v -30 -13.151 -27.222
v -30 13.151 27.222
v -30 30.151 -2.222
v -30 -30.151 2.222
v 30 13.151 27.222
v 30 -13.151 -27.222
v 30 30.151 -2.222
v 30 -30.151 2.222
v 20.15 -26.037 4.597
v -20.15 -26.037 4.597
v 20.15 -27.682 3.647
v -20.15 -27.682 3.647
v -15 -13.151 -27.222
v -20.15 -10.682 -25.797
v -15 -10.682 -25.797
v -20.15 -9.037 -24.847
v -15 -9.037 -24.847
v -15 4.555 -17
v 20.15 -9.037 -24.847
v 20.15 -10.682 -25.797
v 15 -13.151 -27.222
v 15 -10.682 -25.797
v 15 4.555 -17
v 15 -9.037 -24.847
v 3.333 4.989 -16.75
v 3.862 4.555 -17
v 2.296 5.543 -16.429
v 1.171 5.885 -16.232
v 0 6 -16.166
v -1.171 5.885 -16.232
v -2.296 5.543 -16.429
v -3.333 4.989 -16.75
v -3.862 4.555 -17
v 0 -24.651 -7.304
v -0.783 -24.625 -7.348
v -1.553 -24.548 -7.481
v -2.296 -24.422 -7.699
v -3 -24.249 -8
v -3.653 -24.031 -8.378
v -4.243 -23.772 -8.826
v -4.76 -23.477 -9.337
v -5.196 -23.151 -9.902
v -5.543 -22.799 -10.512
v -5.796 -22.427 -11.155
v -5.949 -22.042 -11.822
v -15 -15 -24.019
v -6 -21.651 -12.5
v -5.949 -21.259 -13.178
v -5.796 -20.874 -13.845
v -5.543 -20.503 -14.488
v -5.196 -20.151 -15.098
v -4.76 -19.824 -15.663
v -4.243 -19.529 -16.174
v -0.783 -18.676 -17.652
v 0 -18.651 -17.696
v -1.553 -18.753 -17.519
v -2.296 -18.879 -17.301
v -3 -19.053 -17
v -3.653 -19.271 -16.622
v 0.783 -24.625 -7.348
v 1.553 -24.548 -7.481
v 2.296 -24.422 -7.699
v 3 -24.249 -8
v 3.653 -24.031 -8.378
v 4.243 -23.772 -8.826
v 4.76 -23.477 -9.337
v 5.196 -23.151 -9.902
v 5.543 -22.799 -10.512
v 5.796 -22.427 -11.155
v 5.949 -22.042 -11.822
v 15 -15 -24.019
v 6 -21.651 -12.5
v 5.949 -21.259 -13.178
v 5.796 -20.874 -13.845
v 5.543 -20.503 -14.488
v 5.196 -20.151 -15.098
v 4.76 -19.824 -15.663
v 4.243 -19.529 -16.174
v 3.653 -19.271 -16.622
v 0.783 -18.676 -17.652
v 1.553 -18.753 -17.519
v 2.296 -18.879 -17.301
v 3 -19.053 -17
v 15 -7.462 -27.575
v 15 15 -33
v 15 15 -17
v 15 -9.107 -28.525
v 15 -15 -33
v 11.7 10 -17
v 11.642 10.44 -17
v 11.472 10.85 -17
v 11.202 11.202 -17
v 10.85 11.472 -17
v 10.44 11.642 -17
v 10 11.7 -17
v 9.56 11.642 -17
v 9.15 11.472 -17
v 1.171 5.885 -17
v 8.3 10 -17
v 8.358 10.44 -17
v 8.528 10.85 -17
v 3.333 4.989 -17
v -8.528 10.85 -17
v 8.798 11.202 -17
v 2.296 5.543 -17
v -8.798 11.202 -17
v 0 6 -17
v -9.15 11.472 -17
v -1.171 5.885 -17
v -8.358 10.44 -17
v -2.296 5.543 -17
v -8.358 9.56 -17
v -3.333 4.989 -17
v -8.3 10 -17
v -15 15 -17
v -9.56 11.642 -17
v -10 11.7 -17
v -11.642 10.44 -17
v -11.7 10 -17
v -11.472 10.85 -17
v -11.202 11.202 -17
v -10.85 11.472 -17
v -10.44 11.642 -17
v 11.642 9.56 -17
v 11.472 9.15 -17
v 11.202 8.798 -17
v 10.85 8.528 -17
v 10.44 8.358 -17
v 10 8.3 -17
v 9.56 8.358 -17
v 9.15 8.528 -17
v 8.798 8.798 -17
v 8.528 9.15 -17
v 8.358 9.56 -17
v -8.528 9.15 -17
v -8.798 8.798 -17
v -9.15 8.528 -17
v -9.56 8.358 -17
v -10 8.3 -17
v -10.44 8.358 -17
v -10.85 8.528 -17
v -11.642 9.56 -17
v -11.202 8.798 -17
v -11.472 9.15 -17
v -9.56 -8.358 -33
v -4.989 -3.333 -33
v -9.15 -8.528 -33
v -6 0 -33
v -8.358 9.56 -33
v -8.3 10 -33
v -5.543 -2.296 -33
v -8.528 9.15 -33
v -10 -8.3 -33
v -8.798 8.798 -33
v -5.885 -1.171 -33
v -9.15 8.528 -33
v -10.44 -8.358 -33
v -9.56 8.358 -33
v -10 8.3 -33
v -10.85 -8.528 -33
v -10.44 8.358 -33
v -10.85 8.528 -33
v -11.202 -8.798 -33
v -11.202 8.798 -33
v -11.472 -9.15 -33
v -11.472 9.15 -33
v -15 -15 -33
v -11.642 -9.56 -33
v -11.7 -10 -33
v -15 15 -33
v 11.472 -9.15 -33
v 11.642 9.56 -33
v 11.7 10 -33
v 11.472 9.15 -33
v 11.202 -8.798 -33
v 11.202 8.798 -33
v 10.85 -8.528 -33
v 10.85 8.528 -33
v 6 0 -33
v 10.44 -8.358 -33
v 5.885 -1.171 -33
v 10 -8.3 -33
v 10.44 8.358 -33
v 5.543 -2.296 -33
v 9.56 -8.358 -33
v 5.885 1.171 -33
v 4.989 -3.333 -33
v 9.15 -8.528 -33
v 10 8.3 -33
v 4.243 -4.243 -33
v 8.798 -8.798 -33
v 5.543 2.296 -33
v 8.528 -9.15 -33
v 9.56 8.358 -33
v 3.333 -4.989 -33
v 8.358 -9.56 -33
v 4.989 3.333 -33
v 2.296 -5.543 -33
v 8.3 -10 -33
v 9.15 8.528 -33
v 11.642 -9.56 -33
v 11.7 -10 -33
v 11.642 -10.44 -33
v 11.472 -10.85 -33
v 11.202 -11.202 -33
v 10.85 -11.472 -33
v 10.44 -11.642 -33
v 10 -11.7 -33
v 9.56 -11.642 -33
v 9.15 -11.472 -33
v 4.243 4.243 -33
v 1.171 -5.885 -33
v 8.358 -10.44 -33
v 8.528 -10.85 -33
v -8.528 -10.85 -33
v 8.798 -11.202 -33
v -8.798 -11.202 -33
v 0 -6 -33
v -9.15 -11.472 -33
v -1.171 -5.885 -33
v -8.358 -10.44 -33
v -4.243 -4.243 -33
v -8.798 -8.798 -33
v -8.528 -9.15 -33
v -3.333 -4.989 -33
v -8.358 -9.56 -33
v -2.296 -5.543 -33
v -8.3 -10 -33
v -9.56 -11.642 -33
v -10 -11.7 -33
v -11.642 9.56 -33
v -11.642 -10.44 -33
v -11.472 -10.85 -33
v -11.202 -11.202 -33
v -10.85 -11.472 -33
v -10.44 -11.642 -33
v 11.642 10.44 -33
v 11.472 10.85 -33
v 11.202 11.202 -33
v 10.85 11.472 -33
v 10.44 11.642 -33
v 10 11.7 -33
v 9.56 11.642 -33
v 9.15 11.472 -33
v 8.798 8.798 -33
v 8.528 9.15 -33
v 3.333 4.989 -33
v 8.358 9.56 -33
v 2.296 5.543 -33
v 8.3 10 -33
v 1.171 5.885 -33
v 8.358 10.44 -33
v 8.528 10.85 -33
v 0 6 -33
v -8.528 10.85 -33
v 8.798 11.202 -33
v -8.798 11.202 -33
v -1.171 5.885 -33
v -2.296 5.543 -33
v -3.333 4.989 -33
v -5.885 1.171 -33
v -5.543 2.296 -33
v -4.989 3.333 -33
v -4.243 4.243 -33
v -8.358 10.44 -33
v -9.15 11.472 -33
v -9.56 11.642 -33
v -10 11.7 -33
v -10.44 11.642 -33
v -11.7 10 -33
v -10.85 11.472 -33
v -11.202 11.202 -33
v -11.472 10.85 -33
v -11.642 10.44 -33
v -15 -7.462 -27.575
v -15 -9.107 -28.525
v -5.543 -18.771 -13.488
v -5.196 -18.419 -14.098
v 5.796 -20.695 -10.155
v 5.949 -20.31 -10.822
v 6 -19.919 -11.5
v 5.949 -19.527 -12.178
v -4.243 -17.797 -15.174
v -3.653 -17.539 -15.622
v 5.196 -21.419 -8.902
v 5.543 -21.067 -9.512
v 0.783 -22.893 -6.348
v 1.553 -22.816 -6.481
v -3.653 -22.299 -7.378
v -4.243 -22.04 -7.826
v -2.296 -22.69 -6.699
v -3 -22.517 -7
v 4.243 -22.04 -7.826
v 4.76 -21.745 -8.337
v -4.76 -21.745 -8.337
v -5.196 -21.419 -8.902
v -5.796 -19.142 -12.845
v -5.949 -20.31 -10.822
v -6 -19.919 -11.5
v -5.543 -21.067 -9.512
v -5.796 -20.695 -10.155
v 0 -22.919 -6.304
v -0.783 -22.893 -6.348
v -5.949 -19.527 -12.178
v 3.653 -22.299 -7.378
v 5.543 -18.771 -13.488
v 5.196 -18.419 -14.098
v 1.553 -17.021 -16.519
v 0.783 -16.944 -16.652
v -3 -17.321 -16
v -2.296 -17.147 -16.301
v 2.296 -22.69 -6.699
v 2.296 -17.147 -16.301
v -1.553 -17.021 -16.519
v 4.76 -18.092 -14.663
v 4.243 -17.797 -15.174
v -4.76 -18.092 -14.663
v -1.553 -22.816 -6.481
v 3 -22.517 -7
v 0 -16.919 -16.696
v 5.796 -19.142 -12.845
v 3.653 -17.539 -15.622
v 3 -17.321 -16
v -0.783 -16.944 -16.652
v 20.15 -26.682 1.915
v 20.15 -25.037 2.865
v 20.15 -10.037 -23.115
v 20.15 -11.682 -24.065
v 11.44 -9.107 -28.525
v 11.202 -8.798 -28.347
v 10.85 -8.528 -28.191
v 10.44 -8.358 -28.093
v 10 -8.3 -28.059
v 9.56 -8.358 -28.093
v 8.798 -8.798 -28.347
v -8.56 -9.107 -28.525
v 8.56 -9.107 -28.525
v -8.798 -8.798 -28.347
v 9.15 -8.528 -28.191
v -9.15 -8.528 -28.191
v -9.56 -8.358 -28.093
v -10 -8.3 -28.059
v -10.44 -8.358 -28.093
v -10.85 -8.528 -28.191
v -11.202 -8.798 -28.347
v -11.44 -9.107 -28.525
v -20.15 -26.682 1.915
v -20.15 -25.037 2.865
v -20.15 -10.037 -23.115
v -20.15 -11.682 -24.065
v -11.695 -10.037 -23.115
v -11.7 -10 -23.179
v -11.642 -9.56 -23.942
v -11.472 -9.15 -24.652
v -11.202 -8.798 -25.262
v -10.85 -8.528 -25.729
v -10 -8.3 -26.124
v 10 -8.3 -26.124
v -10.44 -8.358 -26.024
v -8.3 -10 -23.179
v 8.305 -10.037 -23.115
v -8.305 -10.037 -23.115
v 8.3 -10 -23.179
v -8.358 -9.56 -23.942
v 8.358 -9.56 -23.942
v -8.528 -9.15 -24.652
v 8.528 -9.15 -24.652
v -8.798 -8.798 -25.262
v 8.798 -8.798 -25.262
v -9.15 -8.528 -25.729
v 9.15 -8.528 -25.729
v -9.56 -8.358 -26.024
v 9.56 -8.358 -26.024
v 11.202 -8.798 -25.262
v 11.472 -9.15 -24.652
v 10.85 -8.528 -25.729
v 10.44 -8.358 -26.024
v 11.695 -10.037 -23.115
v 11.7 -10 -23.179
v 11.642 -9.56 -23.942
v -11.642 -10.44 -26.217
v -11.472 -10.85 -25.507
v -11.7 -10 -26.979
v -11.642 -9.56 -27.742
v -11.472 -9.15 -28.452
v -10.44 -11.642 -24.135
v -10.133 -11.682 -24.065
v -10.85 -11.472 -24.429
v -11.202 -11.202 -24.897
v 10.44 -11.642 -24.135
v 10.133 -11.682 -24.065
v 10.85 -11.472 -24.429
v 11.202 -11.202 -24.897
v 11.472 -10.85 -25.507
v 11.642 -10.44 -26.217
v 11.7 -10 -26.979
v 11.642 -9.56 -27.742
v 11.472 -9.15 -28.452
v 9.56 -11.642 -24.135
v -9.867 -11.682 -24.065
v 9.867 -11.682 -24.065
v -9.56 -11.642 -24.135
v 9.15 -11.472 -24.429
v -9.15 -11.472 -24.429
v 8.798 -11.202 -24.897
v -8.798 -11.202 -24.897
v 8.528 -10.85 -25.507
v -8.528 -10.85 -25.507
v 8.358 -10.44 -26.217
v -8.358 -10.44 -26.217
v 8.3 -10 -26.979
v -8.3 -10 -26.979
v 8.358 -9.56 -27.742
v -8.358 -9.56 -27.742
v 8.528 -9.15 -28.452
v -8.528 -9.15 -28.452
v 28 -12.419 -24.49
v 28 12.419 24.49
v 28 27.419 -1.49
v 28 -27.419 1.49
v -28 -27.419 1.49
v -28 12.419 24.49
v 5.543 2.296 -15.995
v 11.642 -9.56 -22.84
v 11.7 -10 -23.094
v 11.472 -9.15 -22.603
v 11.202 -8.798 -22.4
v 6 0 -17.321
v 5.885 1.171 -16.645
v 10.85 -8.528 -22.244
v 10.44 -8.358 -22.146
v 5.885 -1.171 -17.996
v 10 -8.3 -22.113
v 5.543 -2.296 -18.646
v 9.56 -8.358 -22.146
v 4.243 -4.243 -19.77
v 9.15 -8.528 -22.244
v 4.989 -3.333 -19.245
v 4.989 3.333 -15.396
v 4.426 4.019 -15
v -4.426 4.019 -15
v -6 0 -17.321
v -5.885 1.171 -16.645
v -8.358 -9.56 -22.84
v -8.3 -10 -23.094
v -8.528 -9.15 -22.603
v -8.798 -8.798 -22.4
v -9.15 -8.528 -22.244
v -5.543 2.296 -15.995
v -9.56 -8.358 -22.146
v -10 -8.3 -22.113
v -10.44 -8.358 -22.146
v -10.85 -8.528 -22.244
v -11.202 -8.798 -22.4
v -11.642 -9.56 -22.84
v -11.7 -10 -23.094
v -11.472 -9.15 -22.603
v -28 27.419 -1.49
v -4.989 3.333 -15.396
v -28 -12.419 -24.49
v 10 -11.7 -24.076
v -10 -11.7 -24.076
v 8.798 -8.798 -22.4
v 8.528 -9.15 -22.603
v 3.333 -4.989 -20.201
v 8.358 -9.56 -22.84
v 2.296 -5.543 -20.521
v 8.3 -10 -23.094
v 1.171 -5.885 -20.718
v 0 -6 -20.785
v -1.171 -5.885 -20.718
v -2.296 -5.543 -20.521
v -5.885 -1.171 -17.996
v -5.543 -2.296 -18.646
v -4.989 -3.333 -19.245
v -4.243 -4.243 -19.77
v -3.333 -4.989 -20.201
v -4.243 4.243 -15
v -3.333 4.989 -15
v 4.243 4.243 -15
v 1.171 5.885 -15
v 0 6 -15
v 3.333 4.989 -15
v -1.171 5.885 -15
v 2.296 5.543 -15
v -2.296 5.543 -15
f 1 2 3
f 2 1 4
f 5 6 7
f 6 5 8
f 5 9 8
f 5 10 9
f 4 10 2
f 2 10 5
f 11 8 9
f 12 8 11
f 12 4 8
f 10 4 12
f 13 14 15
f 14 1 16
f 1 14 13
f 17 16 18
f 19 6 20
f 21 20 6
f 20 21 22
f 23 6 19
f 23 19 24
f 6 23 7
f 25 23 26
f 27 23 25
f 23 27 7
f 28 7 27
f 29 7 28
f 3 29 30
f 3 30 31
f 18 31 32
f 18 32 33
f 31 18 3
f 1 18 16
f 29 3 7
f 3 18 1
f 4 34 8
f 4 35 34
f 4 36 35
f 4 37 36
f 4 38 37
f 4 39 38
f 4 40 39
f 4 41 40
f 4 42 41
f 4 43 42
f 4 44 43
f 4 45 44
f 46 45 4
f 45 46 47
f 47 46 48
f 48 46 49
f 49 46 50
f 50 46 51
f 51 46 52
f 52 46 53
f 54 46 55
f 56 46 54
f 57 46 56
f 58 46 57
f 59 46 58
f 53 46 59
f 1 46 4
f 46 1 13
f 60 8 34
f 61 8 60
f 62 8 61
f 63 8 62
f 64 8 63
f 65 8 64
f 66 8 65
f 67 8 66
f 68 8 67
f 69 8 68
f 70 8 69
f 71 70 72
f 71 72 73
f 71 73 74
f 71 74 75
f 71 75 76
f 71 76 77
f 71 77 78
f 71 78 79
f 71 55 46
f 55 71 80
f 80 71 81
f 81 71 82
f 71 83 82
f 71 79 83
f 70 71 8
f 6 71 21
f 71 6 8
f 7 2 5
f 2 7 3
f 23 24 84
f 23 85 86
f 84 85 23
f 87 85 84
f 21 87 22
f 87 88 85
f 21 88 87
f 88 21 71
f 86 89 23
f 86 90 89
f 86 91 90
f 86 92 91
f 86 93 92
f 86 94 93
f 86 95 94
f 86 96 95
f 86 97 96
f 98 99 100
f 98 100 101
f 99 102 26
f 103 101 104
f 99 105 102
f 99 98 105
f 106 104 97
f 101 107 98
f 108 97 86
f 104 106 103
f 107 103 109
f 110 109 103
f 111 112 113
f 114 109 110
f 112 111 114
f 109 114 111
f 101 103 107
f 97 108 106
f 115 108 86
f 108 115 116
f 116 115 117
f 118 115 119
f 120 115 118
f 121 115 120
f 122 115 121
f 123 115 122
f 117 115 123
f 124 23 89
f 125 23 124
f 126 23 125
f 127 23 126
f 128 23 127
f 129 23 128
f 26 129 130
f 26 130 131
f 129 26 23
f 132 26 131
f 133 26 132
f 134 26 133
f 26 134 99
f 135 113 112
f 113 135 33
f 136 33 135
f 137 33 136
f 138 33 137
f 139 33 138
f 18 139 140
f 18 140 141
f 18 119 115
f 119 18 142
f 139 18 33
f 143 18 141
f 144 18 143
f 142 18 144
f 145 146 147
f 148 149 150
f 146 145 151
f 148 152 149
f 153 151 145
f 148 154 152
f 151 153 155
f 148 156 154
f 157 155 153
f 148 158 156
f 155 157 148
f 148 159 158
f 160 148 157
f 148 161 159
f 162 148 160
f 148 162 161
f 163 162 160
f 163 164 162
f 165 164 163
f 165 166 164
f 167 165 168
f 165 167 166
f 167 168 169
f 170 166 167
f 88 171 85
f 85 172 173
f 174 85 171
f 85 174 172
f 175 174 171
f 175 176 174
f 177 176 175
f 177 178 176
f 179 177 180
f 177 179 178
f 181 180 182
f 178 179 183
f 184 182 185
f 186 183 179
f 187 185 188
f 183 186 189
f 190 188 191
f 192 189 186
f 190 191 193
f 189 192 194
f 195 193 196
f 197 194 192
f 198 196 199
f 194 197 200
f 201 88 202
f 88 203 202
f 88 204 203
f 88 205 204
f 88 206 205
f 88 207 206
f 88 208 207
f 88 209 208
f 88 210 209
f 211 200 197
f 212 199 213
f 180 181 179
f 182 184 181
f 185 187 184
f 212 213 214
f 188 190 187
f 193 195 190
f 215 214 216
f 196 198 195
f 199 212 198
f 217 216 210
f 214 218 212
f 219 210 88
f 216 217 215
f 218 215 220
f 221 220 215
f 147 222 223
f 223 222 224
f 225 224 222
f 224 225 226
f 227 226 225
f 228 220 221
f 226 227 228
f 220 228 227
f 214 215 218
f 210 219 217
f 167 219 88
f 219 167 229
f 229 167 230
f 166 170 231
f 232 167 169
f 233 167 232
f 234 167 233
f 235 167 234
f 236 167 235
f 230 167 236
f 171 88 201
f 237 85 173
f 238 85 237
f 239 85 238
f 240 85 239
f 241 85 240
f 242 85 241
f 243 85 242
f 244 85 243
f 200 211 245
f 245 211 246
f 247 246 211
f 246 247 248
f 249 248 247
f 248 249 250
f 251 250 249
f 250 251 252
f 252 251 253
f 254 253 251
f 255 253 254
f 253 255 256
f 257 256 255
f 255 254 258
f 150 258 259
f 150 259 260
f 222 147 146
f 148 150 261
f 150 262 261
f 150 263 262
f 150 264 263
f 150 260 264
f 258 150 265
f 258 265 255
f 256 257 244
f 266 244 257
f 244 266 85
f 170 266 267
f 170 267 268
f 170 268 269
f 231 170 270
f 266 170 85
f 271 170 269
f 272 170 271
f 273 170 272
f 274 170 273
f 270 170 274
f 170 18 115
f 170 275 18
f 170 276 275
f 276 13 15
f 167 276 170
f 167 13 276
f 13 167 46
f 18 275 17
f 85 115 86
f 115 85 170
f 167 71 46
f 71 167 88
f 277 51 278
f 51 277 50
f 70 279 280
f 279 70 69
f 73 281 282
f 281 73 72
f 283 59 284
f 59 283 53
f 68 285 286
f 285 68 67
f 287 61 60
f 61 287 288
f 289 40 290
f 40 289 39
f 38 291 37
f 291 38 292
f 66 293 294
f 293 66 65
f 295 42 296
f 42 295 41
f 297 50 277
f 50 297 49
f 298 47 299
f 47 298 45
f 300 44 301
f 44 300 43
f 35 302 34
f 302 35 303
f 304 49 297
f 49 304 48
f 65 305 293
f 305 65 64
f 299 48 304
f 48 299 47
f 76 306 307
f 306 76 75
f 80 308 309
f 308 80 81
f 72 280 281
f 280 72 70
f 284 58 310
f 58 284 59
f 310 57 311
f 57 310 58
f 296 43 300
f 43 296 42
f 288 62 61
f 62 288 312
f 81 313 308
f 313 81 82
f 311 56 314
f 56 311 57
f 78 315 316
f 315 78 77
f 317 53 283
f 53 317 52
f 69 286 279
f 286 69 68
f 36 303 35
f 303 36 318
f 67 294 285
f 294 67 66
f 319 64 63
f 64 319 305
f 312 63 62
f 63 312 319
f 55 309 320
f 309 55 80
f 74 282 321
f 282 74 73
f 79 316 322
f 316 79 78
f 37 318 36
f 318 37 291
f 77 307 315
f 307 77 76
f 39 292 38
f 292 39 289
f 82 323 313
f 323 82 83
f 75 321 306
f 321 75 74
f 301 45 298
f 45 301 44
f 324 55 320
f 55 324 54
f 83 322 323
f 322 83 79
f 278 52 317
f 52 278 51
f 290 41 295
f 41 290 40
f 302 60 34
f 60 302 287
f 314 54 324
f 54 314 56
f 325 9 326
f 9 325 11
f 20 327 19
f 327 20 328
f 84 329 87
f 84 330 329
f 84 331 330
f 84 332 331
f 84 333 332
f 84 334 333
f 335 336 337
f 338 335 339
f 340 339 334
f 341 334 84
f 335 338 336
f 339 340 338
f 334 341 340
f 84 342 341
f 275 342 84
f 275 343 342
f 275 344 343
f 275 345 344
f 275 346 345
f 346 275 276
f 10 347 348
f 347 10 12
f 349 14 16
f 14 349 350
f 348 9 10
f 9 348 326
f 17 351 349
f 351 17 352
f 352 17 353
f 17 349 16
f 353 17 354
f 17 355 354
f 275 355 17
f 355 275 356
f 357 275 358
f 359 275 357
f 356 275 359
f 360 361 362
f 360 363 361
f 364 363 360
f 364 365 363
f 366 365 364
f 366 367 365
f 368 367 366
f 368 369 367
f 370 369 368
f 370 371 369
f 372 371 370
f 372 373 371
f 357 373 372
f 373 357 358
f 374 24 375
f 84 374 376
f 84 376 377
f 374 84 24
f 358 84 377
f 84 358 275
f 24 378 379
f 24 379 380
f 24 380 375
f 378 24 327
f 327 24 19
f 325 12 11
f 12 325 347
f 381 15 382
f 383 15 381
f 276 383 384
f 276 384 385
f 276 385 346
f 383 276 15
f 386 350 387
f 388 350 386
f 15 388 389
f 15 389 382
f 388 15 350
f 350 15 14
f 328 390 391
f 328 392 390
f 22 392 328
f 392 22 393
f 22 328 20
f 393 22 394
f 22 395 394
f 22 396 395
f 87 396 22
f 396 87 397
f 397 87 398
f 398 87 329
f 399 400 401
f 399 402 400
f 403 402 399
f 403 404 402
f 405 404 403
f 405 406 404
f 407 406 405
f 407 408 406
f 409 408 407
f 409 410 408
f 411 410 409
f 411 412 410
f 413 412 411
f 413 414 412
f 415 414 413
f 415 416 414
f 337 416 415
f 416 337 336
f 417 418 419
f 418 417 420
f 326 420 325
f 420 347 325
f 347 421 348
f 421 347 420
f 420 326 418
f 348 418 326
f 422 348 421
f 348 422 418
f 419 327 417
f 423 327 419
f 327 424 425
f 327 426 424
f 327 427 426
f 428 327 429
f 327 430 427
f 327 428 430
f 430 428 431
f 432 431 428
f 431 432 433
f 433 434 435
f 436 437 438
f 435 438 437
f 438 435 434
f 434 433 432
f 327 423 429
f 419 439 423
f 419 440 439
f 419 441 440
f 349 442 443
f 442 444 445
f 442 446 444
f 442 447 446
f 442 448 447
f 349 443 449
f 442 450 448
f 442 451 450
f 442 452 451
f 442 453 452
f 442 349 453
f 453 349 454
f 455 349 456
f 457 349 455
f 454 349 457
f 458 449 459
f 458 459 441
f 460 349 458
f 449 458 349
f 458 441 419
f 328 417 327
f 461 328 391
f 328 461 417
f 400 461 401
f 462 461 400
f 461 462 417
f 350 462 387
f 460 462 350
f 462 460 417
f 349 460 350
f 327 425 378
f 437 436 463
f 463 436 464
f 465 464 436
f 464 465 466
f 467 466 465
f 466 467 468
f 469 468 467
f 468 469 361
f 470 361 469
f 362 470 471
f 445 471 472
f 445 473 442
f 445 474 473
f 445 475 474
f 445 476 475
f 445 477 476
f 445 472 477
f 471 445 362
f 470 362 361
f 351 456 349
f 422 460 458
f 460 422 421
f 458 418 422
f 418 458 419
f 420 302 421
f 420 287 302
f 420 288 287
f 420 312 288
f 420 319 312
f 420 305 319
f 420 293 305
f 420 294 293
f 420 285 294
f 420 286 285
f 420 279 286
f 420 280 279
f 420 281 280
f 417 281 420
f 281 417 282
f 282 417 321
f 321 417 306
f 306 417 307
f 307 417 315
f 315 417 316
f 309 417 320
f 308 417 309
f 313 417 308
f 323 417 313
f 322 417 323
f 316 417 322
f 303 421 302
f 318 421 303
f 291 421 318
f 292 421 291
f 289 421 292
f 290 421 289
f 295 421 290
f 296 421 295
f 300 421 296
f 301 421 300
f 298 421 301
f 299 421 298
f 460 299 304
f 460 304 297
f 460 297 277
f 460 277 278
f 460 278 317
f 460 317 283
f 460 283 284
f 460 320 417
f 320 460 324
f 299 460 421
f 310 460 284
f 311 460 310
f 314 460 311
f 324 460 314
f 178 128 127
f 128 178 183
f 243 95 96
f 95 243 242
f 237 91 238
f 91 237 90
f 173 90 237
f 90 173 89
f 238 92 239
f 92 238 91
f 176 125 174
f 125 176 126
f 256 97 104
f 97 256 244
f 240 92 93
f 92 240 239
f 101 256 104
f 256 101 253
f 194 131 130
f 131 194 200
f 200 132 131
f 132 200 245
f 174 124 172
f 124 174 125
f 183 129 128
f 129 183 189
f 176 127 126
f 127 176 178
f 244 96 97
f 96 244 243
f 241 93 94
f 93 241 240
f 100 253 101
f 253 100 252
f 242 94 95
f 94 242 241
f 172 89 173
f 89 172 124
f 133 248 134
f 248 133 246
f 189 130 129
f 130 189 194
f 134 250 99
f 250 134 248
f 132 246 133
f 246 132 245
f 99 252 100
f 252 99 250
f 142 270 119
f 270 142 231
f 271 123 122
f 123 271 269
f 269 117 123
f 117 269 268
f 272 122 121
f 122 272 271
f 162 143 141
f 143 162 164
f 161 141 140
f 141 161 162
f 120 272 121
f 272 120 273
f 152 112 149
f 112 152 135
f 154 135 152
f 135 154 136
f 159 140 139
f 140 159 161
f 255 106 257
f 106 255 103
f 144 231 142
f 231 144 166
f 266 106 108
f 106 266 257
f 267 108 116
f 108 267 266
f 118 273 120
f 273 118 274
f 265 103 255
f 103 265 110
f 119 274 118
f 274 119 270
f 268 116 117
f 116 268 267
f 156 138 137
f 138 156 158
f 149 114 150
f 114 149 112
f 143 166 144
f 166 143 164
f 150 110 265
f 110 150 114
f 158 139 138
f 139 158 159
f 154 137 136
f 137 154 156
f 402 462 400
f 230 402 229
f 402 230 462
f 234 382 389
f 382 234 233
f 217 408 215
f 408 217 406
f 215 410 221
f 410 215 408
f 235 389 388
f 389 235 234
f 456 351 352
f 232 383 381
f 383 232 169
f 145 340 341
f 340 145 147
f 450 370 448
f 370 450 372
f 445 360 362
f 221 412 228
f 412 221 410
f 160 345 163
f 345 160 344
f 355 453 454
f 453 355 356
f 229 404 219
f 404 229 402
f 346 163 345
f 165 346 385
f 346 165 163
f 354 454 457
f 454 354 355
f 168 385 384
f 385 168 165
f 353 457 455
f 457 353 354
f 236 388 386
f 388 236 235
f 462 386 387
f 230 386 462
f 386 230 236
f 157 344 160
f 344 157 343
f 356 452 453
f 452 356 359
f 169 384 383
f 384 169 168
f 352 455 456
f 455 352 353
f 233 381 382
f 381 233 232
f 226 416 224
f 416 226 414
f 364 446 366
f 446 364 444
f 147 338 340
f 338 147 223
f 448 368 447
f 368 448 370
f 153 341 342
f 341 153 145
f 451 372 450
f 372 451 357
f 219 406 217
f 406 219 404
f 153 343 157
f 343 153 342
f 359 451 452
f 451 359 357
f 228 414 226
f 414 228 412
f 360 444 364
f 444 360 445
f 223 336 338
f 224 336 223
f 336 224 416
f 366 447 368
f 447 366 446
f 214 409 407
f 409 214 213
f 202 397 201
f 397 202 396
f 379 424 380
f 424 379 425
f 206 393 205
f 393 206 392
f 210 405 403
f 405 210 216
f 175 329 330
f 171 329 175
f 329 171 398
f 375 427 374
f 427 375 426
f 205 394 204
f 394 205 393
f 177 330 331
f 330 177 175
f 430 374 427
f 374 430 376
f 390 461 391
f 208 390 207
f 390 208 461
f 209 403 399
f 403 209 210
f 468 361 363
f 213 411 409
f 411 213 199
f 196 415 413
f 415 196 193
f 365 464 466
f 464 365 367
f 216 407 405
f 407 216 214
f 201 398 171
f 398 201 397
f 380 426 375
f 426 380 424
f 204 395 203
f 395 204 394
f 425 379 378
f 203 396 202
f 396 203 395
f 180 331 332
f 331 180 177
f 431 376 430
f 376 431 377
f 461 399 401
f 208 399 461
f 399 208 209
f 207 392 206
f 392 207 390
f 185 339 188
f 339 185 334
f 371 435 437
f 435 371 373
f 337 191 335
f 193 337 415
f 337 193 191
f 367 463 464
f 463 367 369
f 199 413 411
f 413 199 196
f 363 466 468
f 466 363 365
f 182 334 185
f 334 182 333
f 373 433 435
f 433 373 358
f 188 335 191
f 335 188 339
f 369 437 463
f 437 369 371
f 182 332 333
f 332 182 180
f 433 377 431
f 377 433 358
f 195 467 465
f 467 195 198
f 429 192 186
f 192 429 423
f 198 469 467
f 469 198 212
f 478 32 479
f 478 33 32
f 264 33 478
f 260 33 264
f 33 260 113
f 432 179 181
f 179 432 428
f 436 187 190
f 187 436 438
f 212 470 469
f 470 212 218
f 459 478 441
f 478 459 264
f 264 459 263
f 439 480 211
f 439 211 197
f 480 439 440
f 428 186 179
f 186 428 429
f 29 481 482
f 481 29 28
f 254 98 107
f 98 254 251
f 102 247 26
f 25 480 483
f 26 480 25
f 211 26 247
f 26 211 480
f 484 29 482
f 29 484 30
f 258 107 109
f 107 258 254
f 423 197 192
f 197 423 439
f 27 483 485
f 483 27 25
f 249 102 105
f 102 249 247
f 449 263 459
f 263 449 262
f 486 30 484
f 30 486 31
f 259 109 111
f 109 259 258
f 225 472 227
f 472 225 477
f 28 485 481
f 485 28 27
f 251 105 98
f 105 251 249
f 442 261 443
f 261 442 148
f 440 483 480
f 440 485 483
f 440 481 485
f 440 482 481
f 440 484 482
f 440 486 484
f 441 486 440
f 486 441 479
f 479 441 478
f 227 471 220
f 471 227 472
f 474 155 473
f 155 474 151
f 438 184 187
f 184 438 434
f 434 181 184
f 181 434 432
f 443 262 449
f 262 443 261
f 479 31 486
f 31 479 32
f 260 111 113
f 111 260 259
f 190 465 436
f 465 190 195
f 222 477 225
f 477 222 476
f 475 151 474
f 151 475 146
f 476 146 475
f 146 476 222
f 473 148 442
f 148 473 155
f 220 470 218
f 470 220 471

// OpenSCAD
// file: common.scad
// common.scad — every dimension in the feeder lives here.
// Change a value, re-run ../check.sh, and every part regrows together.

/* ---------- Printer envelope ---------- */
bed_x = 220;
bed_y = 220;
bed_z = 250;

/* ---------- Material and process ---------- */
wall      = 2.0;    // nominal wall thickness (5 perimeters at 0.4 nozzle)
fit_slide = 0.30;   // clearance for parts that must move against each other
fit_press = 0.15;   // clearance for parts pressed together
$fn       = 96;

/* ---------- Fasteners ---------- */
m3_free = 3.4;      // M3 clearance hole
m3_tap  = 2.8;      // M3 self-tapping into plastic
m4_free = 4.5;

/* ---------- Load cells (VERIFY against the cells you actually buy) ----------
   Figures below are for the common YZC-133 straight bar. Bolt spacing varies
   between suppliers; measure yours before printing the base or the platform. */
cell_l            = 80;
cell_w            = 12.7;
cell_h            = 12.7;
cell_bolt_spacing = 15;   // centre-to-centre, at each end
cell_gap          = 3;    // spacer thickness — the beam MUST be free to flex

/* ---------- Food model ---------- */
kibble_density = 0.40;   // g/cm^3, dry kibble bulk density

/* ---------- Hopper ---------- */
hopper_volume_l = 2.0;
hopper_mouth    = 140;   // inner, square, at the top
hopper_throat   = 55;    // inner, square, at the bottom

// Square frustum volume: V = h/3 * (A1 + A2 + sqrt(A1*A2))
// For squares sqrt(A1*A2) collapses to mouth*throat, so height is exact:
hopper_h = 3 * hopper_volume_l * 1000000 /
           (hopper_mouth*hopper_mouth + hopper_throat*hopper_throat +
            hopper_mouth*hopper_throat);

hopper_run        = (hopper_mouth - hopper_throat) / 2;
hopper_wall_angle = atan(hopper_h / hopper_run);   // from horizontal
hopper_taper_rate = (hopper_mouth - hopper_throat) / hopper_h;
hopper_capacity_g = hopper_volume_l * 1000 * kibble_density;

/* ---------- Drum valve ---------- */
drum_dia       = 50;
drum_len       = 60;
drum_clearance = 0.4;                      // radial
drum_bore      = drum_dia + 2*drum_clearance;
pocket_depth   = 11.3;                     // segment depth of the scoop
shaft_dia      = 6;
shaft_len      = 8;

// Circular-segment maths. OpenSCAD trig is in DEGREES; the segment area
// formula needs the angle in RADIANS, hence the two forms below.
drum_r          = drum_dia / 2;
pocket_theta    = 2 * acos(1 - pocket_depth/drum_r);        // degrees
pocket_theta_r  = pocket_theta * PI / 180;                  // radians
pocket_area     = drum_r*drum_r/2 * (pocket_theta_r - sin(pocket_theta));
pocket_volume   = pocket_area * drum_len;                   // mm^3
sweep_grams     = pocket_volume / 1000 * kibble_density;    // DERIVED, not assumed

/* ---------- Valve housing ---------- */
housing_x = drum_len + 4*wall;      // along the drum axis
housing_y = drum_bore + 4*wall;
housing_z = drum_bore + 4*wall;
outlet_x  = 45;
outlet_y  = 45;

/* ---------- Chute ---------- */
chute_forward = 70;    // how far forward of the tower the food lands
chute_drop    = 90;    // vertical fall from valve outlet to chute exit
chute_exit    = 40;
chute_clear   = 40;    // exit height above the bowl rim — impulse, not load

/* ---------- Bowl and platform ---------- */
bowl_dia     = 140;    // the BOUGHT stainless/ceramic bowl
platform_dia = 150;
platform_t   = 5;
ring_w       = 3;
ring_h       = 8;
bowl_gap     = 6;      // air on every side — the isolation gap

/* ---------- Base and tower ---------- */
base_size = 190;
base_t    = 6;
bay_h     = 28;        // electronics bay height
tower_w   = 90;
tower_d   = 70;
tower_h   = 150;

/* ---------- Head ---------- */
head_tilt   = 30;      // camera, degrees down from horizontal
cam_pcb     = [40, 40, 1.6];
sr04_dia    = 16;
sr04_pitch  = 26;      // centre-to-centre of the two transducers

/* ---------- Derived overall ---------- */
total_h = base_t + bay_h + tower_h + housing_z + hopper_h;

/* ---------- Assertions: the things that silently ruin a print ---------- */
assert(hopper_wall_angle >= 60,
       str("Hopper wall ", hopper_wall_angle, " deg is below 60 - kibble will bridge"));
assert(hopper_h + 2*wall <= bed_z,
       str("Hopper ", hopper_h, " mm exceeds bed Z ", bed_z));
assert(hopper_mouth + 2*wall <= bed_x,
       "Hopper mouth exceeds bed X");
assert(base_size <= bed_x && base_size <= bed_y,
       "Base exceeds bed footprint");
assert(platform_dia <= bed_x, "Bowl platform exceeds bed X");
assert(drum_clearance > 0, "Drum clearance must be positive or the drum seizes");
assert(drum_bore > drum_dia, "Drum bore must exceed drum diameter");
assert(pocket_depth < drum_r,
       "Pocket deeper than the drum radius - the scoop would cut through the axis");
assert(sweep_grams > 6 && sweep_grams < 10,
       str("Sweep delivers ", sweep_grams, " g - outside the 6-10 g design window"));
assert(bowl_gap > 0, "Bowl isolation gap must be positive");
assert(cell_gap > 0, "Load cell needs a flex gap or it reads nothing");
assert(chute_forward + 40 <= bed_y,
       "Bowl arm exceeds bed Y - split it or shorten chute_forward");

/* ---------- Shared geometry ---------- */
// A square frustum, bottom face on the XY plane, centred on Z.
module frustum(bottom, top, h) {
  linear_extrude(height = h, scale = top/bottom)
    square([bottom, bottom], center = true);
}

// A rectangular tube used for the labyrinth lip on the lid and hopper mouth.
module lip(inner, thickness, h) {
  difference() {
    cube([inner + 2*thickness, inner + 2*thickness, h], center = true);
    cube([inner, inner, h + 1], center = true);
  }
}

// Four bolt holes on a square pattern.
module bolt_square(spacing, dia, h) {
  for (i = [0:3])
    rotate([0, 0, 90*i])
      translate([spacing/2, spacing/2, 0])
        cylinder(d = dia, h = h, center = true, $fn = 24);
}

// The cantilever footprint a load cell bolts into: two holes plus a relief slot.
module cell_mount(dia = m3_tap, h = 10) {
  for (y = [-cell_bolt_spacing/2, cell_bolt_spacing/2])
    translate([0, y, 0]) cylinder(d = dia, h = h, center = true, $fn = 24);
}

echo(str("hopper_h = ", hopper_h, " mm"));
echo(str("hopper wall angle = ", hopper_wall_angle, " deg"));
echo(str("hopper capacity = ", hopper_capacity_g, " g"));
echo(str("sweep = ", sweep_grams, " g"));
echo(str("total height = ", total_h, " mm"));
// main file
include <common.scad>

shell = [60, 50, 34];

module head() {
  difference() {
    union() {
      // Shell, tilted so the camera looks down and forward at the bowl.
      rotate([head_tilt, 0, 0])
        cube(shell, center = true);
      // Neck that bolts to the top of the tower.
      translate([0, 0, -shell[2]/2 - 8])
        cube([30, 30, 16], center = true);
    }

    // Camera aperture and PCB pocket.
    rotate([head_tilt, 0, 0]) {
      translate([0, -shell[1]/2, 0])
        rotate([90, 0, 0]) cylinder(d = 12, h = 2*wall + 2, center = true, $fn = 48);
      translate([0, -shell[1]/2 + wall + cam_pcb[2]/2 + 1, 0])
        cube([cam_pcb[0] + fit_slide, cam_pcb[2] + fit_slide, cam_pcb[1] + fit_slide],
             center = true);
      // Hollow the shell.
      cube([shell[0] - 2*wall, shell[1] - 2*wall, shell[2] - 2*wall], center = true);
    }

    // Cable exit through the neck.
    translate([0, 0, -shell[2]/2 - 8])
      cylinder(d = 12, h = 20, center = true, $fn = 32);
    // Neck bolts.
    translate([0, 0, -shell[2]/2 - 8]) bolt_square(20, m3_free, 20);
  }
}

head();
